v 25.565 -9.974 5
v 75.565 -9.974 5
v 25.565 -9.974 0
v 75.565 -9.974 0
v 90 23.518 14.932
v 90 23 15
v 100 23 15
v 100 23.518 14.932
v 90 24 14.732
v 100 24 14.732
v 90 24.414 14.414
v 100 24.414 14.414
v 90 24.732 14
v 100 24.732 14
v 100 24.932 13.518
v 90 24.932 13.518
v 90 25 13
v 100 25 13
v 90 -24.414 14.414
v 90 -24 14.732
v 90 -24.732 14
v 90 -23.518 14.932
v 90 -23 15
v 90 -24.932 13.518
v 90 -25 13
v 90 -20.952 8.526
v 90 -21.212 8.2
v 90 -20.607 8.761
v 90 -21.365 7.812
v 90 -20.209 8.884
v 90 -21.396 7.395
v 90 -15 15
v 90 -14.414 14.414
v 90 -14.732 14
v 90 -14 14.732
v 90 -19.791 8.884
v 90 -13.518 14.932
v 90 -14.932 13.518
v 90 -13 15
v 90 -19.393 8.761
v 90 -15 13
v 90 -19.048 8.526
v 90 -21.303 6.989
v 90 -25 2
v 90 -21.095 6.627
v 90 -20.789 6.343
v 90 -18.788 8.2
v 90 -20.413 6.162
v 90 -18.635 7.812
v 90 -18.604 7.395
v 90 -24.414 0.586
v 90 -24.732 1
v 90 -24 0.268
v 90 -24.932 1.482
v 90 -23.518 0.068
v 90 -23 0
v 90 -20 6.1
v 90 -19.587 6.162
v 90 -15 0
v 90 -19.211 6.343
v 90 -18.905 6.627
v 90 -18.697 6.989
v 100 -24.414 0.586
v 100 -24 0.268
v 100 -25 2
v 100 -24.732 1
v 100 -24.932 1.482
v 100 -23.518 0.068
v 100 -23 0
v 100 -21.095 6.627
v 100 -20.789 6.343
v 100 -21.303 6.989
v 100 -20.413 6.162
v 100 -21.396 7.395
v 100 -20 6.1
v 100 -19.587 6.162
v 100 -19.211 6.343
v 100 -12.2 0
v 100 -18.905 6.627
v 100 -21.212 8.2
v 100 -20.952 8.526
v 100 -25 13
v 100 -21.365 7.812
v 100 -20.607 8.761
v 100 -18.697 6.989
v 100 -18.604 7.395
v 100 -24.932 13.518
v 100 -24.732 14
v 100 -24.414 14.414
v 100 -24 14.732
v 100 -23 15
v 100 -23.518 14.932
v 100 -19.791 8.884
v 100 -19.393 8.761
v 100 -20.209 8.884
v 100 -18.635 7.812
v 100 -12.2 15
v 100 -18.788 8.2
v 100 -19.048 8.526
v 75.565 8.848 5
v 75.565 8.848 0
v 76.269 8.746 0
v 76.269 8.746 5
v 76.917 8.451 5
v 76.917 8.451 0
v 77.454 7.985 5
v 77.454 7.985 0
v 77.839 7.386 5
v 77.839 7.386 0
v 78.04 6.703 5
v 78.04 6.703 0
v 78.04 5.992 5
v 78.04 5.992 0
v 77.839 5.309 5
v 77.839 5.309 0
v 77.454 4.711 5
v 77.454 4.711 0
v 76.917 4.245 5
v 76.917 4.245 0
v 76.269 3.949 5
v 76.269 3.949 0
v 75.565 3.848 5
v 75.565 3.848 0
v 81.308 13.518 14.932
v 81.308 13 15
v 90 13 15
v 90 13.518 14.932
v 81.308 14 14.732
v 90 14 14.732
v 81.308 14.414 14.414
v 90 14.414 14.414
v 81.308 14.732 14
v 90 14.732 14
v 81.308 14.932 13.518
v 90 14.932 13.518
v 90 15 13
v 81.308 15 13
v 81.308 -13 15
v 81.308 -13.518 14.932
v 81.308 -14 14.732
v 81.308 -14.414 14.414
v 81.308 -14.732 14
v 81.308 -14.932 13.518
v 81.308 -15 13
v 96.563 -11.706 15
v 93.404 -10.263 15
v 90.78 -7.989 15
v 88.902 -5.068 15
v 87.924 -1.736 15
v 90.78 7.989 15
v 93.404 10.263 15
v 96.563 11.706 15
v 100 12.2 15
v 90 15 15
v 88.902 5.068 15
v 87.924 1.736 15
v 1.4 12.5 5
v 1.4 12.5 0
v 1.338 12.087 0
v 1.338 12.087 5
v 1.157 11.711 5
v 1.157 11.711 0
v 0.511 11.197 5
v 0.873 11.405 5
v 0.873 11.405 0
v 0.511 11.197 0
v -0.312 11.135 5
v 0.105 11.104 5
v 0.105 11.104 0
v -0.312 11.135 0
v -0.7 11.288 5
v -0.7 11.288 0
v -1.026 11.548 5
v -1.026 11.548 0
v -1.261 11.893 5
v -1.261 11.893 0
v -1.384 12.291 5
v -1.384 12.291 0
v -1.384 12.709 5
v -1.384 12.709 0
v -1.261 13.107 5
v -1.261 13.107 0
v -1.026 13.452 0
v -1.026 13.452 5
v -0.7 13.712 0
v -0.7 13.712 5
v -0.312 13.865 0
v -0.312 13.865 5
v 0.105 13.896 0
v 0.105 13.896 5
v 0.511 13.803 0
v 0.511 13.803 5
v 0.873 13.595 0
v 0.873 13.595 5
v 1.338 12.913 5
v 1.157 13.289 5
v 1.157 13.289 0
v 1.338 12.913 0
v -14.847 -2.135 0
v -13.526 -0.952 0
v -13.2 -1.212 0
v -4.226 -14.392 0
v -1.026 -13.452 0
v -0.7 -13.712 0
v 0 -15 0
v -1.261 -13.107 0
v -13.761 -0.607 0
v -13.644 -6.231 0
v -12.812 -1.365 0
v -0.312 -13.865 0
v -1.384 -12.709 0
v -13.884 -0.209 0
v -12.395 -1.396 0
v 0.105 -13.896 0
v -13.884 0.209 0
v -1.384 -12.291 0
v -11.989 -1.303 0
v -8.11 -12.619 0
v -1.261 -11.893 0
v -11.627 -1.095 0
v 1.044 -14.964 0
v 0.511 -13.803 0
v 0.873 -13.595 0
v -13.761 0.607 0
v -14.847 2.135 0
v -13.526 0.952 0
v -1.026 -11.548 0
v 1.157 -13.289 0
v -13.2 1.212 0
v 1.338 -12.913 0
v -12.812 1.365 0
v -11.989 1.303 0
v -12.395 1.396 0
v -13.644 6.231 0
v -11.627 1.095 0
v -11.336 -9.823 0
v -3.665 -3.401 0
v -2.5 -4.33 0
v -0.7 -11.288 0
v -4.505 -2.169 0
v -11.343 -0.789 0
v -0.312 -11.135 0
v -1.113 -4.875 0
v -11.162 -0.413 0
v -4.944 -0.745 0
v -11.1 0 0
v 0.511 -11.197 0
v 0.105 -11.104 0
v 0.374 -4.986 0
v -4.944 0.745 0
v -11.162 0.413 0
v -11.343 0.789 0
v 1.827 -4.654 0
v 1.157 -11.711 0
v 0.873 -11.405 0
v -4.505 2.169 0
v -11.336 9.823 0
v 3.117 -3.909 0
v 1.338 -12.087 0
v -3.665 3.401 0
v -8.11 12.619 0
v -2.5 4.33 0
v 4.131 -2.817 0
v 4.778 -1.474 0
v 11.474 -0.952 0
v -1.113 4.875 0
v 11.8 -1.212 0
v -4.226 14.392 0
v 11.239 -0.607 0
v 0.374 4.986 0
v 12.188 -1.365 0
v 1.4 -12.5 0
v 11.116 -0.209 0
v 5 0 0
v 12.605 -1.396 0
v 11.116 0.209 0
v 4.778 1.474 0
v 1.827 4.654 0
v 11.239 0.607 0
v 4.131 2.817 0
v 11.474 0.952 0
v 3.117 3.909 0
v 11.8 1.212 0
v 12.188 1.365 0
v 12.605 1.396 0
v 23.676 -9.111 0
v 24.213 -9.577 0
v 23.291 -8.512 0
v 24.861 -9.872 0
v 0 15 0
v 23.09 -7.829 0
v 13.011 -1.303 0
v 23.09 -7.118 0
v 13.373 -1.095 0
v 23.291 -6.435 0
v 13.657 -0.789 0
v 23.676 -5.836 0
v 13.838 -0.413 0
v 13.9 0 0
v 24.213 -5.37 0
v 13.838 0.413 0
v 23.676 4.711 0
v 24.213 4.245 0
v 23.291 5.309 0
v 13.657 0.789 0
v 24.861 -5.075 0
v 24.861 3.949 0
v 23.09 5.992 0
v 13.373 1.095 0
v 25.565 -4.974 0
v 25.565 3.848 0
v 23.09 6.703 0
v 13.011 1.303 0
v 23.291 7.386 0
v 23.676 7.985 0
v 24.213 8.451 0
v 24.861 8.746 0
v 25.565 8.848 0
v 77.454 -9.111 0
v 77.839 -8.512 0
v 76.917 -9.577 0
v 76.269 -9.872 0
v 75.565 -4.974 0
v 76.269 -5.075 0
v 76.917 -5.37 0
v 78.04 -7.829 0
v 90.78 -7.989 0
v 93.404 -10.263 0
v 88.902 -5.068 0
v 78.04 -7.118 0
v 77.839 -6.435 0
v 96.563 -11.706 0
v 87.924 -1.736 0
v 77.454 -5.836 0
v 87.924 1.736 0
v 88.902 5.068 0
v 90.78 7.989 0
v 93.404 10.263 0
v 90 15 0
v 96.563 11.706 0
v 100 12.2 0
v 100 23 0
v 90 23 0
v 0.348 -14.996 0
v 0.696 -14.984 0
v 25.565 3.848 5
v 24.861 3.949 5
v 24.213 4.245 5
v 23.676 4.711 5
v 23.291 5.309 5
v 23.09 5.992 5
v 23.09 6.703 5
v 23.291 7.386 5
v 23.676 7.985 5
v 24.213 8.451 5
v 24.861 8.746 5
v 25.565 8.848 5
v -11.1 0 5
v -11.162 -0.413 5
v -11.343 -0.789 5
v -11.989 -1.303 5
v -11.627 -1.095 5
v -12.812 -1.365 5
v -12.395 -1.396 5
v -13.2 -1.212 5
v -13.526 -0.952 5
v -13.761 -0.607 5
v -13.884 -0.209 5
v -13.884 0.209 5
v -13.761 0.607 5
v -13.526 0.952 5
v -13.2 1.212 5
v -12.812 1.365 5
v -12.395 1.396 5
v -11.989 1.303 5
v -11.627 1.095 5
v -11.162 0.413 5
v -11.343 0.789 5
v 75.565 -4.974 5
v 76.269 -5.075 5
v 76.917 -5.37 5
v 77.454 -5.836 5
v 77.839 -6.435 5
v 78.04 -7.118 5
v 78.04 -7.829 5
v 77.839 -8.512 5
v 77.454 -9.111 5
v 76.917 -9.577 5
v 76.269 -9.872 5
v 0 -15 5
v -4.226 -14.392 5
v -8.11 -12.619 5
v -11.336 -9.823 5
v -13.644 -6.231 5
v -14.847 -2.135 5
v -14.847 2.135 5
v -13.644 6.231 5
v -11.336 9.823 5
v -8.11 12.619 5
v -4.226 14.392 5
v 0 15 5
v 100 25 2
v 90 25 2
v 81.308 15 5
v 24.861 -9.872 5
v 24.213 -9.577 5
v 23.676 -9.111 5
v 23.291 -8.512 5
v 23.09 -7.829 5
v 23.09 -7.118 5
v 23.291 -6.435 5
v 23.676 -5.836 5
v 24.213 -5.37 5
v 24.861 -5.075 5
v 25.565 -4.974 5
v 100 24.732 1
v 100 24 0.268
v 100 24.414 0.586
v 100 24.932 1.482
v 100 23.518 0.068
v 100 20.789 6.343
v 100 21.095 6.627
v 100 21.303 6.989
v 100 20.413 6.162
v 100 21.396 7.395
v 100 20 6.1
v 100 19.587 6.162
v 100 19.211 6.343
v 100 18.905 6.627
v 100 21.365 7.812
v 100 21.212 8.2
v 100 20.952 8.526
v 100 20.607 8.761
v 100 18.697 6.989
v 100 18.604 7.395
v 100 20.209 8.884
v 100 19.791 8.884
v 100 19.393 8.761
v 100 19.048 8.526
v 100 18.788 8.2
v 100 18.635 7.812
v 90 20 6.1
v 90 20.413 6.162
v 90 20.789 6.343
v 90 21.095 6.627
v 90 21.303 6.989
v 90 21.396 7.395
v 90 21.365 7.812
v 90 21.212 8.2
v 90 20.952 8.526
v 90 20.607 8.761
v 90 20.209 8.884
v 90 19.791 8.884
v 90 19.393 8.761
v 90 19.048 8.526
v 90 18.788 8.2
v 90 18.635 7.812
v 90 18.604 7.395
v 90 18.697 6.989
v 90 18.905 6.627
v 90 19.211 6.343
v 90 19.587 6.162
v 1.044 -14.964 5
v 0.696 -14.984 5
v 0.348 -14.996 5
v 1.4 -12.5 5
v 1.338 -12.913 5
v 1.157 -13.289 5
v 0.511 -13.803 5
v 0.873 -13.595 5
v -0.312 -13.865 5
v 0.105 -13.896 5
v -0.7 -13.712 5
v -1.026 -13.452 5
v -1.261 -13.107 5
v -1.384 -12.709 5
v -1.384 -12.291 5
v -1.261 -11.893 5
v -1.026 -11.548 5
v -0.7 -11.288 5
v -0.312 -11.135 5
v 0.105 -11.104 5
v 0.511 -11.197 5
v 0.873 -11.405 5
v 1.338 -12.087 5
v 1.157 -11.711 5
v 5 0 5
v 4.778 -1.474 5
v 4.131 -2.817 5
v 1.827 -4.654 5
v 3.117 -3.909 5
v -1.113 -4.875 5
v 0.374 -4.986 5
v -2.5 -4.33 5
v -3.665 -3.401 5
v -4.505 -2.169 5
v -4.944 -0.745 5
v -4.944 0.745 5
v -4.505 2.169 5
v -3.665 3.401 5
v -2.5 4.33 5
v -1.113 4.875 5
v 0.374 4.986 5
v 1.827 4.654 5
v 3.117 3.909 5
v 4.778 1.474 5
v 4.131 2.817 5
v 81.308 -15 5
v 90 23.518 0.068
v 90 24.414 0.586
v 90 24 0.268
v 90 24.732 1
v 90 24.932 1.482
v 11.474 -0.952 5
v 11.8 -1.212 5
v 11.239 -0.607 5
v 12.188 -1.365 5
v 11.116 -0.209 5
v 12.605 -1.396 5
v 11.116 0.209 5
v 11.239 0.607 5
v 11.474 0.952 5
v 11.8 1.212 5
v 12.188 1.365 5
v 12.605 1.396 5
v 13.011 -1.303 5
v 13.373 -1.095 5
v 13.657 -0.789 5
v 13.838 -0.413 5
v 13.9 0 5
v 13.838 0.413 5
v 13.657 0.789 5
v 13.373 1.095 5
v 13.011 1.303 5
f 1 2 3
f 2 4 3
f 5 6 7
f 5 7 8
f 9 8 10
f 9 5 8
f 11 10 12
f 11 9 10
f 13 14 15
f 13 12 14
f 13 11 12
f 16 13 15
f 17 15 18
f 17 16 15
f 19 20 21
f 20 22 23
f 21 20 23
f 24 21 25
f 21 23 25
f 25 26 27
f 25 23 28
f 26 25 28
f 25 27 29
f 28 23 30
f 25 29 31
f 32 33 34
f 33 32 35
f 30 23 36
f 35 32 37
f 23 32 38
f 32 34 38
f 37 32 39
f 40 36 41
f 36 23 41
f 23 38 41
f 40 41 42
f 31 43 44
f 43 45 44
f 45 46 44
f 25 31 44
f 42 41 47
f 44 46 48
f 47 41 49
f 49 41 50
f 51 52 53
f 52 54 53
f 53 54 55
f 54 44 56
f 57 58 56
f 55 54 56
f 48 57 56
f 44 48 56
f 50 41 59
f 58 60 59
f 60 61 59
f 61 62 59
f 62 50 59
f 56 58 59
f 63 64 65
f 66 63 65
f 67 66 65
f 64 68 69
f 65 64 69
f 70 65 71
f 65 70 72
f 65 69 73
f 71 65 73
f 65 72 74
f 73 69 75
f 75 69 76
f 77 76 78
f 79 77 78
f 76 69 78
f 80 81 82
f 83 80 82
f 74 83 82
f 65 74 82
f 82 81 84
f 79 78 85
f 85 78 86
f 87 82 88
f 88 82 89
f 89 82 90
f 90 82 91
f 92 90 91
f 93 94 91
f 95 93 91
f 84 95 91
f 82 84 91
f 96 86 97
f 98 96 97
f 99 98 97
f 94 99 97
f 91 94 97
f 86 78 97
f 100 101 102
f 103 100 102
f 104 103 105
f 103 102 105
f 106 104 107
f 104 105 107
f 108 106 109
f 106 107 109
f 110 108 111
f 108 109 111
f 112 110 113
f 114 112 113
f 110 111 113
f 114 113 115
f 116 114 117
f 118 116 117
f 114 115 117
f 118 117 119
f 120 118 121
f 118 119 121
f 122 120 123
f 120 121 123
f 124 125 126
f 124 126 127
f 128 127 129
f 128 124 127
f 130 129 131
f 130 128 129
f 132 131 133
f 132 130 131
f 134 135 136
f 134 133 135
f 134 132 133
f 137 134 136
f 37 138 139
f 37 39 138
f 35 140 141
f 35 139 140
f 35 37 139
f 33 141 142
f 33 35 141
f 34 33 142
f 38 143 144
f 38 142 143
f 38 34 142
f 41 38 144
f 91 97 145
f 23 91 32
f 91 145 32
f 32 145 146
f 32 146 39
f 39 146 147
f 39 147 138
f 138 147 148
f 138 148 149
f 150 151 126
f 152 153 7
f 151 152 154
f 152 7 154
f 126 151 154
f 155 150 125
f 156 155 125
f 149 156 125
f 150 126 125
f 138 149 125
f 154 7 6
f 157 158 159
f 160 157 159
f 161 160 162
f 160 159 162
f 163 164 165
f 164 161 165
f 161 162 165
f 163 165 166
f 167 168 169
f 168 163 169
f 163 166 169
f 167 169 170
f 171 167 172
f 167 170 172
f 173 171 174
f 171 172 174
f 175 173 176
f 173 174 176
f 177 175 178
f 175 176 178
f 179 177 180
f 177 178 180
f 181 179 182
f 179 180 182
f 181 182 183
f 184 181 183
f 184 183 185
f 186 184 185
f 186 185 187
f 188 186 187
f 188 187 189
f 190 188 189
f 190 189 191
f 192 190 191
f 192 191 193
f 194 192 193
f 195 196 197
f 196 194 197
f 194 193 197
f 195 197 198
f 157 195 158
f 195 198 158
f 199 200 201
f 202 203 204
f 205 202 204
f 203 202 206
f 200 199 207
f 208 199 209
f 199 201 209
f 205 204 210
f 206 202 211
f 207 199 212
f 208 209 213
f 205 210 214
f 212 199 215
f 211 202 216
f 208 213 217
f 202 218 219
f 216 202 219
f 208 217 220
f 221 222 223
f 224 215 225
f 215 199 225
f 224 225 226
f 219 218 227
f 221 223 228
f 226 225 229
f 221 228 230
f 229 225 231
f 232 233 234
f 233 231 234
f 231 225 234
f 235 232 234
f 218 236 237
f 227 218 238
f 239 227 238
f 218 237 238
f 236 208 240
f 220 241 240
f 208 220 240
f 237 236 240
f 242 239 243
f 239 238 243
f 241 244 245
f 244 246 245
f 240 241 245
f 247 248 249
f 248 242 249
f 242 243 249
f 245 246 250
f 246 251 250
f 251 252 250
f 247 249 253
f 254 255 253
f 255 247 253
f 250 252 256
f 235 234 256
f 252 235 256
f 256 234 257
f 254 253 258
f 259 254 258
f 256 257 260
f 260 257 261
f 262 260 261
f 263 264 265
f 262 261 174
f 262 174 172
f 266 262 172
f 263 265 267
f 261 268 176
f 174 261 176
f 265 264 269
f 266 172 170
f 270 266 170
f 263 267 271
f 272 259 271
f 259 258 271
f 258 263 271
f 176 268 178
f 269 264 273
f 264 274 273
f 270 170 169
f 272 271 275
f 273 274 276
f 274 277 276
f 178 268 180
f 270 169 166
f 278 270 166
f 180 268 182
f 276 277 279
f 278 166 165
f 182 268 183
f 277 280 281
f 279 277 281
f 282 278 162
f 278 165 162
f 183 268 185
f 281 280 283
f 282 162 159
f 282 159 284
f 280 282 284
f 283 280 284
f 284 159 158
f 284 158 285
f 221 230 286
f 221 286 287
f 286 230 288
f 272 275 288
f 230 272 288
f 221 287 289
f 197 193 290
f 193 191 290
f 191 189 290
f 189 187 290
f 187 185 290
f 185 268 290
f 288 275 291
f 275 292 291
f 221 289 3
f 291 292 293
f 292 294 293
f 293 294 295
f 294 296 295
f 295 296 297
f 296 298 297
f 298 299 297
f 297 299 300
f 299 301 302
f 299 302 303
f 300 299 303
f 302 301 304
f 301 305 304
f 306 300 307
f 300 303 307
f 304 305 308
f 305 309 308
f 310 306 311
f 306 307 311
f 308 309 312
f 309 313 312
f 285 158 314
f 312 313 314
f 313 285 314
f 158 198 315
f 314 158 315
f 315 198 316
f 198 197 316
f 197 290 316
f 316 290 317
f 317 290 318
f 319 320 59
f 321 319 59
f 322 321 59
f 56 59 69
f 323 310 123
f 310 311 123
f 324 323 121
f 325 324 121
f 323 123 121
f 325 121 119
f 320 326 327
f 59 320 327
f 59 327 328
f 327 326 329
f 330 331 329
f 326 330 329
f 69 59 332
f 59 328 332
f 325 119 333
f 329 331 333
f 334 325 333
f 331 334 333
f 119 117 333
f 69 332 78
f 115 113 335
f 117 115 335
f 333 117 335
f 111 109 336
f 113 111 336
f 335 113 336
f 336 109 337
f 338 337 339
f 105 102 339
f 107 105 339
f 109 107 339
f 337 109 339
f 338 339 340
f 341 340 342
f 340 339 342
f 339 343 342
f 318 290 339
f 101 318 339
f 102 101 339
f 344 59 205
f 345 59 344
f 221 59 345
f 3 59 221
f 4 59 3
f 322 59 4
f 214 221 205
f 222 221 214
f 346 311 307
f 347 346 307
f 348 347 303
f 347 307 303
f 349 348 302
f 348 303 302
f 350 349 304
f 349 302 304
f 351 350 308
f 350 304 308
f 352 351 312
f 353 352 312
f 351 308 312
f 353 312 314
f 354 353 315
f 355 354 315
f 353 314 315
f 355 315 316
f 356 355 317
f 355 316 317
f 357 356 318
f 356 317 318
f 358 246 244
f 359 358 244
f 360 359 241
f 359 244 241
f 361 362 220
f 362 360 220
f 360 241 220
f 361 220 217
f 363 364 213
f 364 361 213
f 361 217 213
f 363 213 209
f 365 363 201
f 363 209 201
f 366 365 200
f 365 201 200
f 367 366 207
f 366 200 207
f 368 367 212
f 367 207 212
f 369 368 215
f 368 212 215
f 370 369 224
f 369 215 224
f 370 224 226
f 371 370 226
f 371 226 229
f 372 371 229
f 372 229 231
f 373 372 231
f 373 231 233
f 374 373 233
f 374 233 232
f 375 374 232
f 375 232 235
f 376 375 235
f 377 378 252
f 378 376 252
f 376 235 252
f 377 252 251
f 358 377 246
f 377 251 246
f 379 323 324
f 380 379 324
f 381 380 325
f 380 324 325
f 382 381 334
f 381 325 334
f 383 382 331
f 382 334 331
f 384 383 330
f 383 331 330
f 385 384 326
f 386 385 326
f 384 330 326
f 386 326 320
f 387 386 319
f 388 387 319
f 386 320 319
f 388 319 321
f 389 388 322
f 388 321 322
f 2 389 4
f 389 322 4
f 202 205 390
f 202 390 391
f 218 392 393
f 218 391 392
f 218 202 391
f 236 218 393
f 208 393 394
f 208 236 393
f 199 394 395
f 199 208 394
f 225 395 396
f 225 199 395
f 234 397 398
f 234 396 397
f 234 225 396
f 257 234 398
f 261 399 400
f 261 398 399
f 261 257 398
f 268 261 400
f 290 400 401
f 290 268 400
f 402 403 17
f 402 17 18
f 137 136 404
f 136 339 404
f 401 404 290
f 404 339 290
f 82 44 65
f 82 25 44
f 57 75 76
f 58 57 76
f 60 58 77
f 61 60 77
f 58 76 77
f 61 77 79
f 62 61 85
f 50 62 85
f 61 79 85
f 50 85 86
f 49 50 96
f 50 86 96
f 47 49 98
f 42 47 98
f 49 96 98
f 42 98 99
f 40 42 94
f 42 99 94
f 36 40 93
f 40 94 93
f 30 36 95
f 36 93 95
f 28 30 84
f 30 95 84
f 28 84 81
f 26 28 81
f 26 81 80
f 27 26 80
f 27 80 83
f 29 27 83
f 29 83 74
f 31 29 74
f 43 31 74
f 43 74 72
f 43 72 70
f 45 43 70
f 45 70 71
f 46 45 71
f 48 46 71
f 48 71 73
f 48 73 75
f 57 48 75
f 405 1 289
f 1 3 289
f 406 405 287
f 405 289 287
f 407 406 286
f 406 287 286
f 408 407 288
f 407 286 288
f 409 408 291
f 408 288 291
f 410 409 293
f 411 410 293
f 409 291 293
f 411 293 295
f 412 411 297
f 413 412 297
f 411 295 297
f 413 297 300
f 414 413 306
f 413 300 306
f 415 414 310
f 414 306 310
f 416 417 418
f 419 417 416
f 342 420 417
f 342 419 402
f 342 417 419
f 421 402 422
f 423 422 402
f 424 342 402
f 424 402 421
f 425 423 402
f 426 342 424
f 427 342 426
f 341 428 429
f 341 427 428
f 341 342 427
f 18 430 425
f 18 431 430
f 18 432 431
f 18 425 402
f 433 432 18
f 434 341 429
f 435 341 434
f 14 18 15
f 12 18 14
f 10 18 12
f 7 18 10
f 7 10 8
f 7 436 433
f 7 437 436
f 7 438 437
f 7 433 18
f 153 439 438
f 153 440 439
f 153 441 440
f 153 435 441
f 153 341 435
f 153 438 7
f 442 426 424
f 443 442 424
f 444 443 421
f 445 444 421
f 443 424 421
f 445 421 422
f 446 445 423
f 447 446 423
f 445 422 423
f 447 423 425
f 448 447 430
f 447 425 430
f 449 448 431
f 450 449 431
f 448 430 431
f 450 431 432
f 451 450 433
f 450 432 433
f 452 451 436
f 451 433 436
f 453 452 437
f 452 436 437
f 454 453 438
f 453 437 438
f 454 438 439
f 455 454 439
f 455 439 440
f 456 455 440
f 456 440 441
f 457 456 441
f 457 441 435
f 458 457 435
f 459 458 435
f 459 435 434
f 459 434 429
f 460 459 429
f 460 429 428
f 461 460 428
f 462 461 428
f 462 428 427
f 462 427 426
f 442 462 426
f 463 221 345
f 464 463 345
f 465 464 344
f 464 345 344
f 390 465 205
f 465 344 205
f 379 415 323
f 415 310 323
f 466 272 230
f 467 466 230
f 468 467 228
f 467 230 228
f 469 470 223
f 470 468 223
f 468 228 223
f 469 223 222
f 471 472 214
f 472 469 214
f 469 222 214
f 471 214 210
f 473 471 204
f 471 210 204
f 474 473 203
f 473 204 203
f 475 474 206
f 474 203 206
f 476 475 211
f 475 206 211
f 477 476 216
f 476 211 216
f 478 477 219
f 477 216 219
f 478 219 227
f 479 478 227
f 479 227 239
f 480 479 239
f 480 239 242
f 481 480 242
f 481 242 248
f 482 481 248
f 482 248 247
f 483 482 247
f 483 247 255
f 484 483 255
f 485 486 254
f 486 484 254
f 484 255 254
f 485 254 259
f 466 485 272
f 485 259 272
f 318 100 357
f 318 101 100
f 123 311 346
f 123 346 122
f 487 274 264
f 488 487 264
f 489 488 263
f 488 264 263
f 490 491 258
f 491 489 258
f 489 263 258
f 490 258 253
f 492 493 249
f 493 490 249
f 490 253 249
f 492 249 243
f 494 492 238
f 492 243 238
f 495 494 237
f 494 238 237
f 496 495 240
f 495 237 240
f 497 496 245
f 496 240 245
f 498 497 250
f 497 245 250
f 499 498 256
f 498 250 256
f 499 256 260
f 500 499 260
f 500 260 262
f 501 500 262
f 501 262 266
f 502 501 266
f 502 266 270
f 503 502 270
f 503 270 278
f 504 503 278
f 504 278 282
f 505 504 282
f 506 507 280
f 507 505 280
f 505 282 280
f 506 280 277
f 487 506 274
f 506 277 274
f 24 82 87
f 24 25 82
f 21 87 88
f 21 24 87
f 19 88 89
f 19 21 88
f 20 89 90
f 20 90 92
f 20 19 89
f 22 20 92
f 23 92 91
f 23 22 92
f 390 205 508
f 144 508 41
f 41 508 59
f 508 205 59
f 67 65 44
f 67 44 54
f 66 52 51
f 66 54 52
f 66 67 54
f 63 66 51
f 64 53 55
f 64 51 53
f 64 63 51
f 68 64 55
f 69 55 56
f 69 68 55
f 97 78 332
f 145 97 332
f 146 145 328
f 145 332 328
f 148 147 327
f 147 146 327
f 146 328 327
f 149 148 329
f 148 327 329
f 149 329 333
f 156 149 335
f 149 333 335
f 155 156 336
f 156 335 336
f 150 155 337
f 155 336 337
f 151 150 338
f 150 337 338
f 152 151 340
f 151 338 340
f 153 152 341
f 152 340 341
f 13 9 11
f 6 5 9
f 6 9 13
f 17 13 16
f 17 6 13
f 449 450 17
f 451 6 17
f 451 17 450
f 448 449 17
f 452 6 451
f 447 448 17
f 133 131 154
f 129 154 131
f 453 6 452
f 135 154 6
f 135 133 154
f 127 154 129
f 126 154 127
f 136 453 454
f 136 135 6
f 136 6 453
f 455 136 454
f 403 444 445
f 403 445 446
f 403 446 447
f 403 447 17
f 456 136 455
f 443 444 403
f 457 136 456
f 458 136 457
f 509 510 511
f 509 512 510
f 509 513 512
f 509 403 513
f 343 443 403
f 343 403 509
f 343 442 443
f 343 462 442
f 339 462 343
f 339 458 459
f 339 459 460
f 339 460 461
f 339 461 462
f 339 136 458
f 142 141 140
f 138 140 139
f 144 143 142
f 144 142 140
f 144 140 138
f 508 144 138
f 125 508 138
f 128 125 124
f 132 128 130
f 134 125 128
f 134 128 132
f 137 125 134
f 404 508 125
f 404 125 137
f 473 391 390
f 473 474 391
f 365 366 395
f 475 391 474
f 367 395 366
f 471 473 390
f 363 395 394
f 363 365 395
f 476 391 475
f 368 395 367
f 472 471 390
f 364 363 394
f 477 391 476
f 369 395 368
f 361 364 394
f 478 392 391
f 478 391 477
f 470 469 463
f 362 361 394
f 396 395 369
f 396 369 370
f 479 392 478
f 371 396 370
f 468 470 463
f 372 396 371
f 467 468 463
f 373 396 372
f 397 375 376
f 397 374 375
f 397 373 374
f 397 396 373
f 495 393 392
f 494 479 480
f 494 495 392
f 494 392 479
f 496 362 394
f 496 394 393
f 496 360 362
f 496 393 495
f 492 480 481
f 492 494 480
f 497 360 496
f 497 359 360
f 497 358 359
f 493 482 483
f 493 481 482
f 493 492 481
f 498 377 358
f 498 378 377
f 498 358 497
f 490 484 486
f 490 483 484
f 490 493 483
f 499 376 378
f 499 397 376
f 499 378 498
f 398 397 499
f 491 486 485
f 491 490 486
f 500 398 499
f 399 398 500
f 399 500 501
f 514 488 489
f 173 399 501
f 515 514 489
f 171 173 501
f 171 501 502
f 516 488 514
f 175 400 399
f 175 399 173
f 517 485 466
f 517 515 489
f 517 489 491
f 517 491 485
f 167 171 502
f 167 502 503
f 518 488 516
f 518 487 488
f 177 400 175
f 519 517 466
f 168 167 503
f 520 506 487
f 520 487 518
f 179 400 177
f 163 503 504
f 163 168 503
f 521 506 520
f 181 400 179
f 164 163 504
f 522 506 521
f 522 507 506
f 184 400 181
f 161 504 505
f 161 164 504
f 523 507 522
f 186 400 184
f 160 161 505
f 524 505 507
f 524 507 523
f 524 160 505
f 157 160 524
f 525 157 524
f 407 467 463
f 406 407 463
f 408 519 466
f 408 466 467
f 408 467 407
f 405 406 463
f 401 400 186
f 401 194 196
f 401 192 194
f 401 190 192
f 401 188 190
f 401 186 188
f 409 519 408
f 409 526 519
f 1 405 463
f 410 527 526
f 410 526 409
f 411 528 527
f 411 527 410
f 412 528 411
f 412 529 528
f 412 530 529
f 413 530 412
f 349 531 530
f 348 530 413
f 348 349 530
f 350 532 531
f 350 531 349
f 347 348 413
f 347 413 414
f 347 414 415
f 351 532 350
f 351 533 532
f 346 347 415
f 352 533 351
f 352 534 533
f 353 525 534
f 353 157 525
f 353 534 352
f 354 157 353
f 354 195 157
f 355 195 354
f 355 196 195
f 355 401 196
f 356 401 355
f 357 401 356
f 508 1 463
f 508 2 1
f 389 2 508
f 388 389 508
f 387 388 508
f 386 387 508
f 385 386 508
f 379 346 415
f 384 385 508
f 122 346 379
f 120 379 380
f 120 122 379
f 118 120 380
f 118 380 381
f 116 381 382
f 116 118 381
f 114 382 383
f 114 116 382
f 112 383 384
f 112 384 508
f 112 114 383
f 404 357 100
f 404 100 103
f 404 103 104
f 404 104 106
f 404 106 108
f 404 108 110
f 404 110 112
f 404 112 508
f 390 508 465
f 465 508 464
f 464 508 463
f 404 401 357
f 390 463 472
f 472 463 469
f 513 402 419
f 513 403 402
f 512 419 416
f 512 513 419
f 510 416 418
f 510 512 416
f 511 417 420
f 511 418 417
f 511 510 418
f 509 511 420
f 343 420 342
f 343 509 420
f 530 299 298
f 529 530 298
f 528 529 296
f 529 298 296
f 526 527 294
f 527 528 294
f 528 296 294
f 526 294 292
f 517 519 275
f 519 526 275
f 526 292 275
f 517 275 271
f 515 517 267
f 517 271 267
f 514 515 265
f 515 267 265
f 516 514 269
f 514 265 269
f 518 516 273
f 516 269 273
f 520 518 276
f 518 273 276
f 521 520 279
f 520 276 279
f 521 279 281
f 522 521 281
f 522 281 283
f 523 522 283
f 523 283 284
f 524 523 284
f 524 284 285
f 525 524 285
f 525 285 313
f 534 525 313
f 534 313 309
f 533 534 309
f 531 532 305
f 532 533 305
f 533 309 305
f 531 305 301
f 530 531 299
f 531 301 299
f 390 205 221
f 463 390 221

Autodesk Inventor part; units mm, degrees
ref_plane "YZ Plane" through (0, 0, 0) normal (1, 0, 0) x (0, 1, 0)
ref_plane "XZ Plane" through (0, 0, 0) normal (0, 1, 0) x (-1, 0, 0)
ref_plane "XY Plane" through (0, 0, 0) normal (0, 0, 1) x (1, 0, 0)
sketch "Sketch1" plane through (0, 0, 0) normal (0, 0, 1) x (1, 0, 0)
  circle A0 centre (0, 0) radius 15
  circle A1 centre (0, 0) radius 5
  circle A2 centre (-12.5, 0) radius 1.4
  circle A3 centre (0, -12.5) radius 1.4
  circle A4 centre (12.5, 0) radius 1.4
  circle A5 centre (0, 12.5) radius 1.4
  line L0 (0, -15) -> (1.0439, -14.9636)
  line L1 (100, 15) -> (70, 15)
  line L2 (70, -12.5614) -> (70, -15)
  line L3 (70, -15) -> (100, -15)
  line L4 (100, -15) -> (100, 15)
  line L5 (100, 15) -> (70, -15) construction
  line L6 (70, 15) -> (100, -15) construction
  circle A6 centre (100, 0) radius 12.2
  line L7 (0, 15) -> (100, 15)
  line L8 (0, -15) -> (100, -15)
  point P0 (85, 0)
  point P1 (100, -12.2)
  point P2 (100, 12.2)
  dimension "d0" = 30
  dimension "d1" = 10
  dimension "d2" = 2.8
  dimension "d3" = 12.5
  dimension "d6" = 360
  dimension "d9" = 30
  dimension "d10" = 30
  dimension "d11" = 24.4
  dimension "d12" = 100
extrude "Extrusion1" add sketch "Sketch1" along normal blind 5 contours A0 L0 | A0 L7 L1 L4 A6 L3 L8 picked at (9.3778, -4.158)
sketch "Sketch2" plane through (0, 15, 0) normal (0, 1, 0) x (1, 0, 0)
  point P0 (0, 0)
sketch "Sketch3" plane through (0, 0, 5) normal (0, 0, 1) x (1, 0, 0)
  line L0 (100, 15) -> (0, 15) projected
  line L1 (0, -15) -> (100, -15) projected
  line L2 (81.3075, 15) -> (100, 15)
  line L3 (100, 15) -> (100, -15)
  line L4 (100, -15) -> (81.3075, -15)
  line L5 (81.3075, -15) -> (81.3075, 15)
  circle A0 centre (100, 0) radius 12.2
  point P0 (0, 0)
  point P1 (100, -12.2)
  point P2 (100, 12.2)
  dimension "d15" = 24.4
extrude "Extrusion2" add sketch "Sketch3" along normal blind 10 contours L3 A0 L1 L5 L0
sketch "Sketch4" plane through (0, 15, 0) normal (0, 1, 0) x (1, 0, 0)
  line L0 (100, 0) -> (100, -15) projected
  line L1 (100, 0) -> (87.8, 0) projected
  line L2 (100, -15) -> (90, -15)
  line L3 (90, -15) -> (90, 0)
  line L4 (90, 0) -> (100, 0)
  line L5 (100, 0) -> (100, -15)
  point P0 (0, 0)
  dimension "d18" = 10
extrude "Extrusion3" add sketch "Sketch4" along normal blind 10
sketch "Sketch5" plane through (0, -15, 0) normal (0, -1, 0) x (1, 0, 0)
  line L0 (100, 0) -> (100, 15) projected
  line L1 (100, 15) -> (90, 15)
  line L2 (90, 15) -> (90, 0)
  line L3 (90, 0) -> (100, 0)
  line L4 (100, 0) -> (100, 15)
  point P0 (0, 0)
  dimension "d21" = 10
  dimension "d22" = 15
extrude "Extrusion4" add sketch "Sketch5" along normal blind 10
sketch "Sketch6" plane through (100, -12.2, 15) normal (1, 0, 0) x (0, 0, -1)
  circle A0 centre (7.5, -7.8) radius 1.4
  line L0 (15, -12.8) -> (0, -12.8) projected
  line L1 (0, 0) -> (0, -12.8) projected
  line L2 (15, 12.2) -> (0, 12.2)
  line L3 (0, 0) -> (0, 24.4) projected
  circle A1 centre (7.5, 32.2) radius 1.4
  dimension "d25" = 2.8
  dimension "d26" = 5
  dimension "d27" = 7.5
extrude "Extrusion5" cut sketch "Sketch6" against normal through all
fillet "Fillet1" radius 2 2 edges at (95, -25, 0) (95, -25, 15)
fillet "Fillet2" radius 2 2 edges at (95, 25, 0) (95, 25, 15)
sketch "Sketch7" plane through (0, 0, 0) normal (0, 0, -1) x (-1, 0, 0)
  line L0 (-81.3075, 15) -> (-81.3075, -15) projected
  line L1 (-17.3755, -15) -> (-81.3075, -15)
  line L2 (-81.3075, -15) -> (-81.3075, 15)
  line L3 (-81.3075, 15) -> (-17.3755, 15)
  line L4 (-17.3755, 15) -> (-17.3755, -15)
  line L5 (-25.565, -7.4736) -> (-75.565, -7.4736) construction
  line L6 (-25.565, -4.9736) -> (-75.565, -4.9736)
  line L7 (-75.565, -9.9736) -> (-25.565, -9.9736)
  arc A0 (-25.565, -9.9736) -> (-25.565, -4.9736) centre (-25.565, -7.4736) ccw
  arc A1 (-75.565, -4.9736) -> (-75.565, -9.9736) centre (-75.565, -7.4736) ccw
  line L8 (-25.565, 6.3477) -> (-75.565, 6.3477) construction
  line L9 (-25.565, 3.8477) -> (-75.565, 3.8477)
  line L10 (-75.565, 8.8477) -> (-25.565, 8.8477)
  arc A2 (-25.565, 3.8477) -> (-25.565, 8.8477) centre (-25.565, 6.3477) ccw
  arc A3 (-75.565, 8.8477) -> (-75.565, 3.8477) centre (-75.565, 6.3477) ccw
  point P0 (0, 0)
  point P1 (-50.565, -7.4736)
  point P2 (-50.565, 6.3477)
  dimension "d32" = 30
  dimension "d33" = 5
  dimension "d34" = 50
  dimension "d35" = 50
  dimension "d36" = 2.5
extrude "Extrusion6" cut sketch "Sketch7" against normal through all contours A0 L7 A1 L6 | L9 A3 L10 A2
fillet "Fillet3" radius 2 2 edges at (85.6537, 15, 15) (85.6537, -15, 15)
sketch "Sketch8" plane through (90, 15, 0) normal (-1, 0, 0) x (0, 0, 1)
  point P0 (0, -15)
properties part number "link1"
